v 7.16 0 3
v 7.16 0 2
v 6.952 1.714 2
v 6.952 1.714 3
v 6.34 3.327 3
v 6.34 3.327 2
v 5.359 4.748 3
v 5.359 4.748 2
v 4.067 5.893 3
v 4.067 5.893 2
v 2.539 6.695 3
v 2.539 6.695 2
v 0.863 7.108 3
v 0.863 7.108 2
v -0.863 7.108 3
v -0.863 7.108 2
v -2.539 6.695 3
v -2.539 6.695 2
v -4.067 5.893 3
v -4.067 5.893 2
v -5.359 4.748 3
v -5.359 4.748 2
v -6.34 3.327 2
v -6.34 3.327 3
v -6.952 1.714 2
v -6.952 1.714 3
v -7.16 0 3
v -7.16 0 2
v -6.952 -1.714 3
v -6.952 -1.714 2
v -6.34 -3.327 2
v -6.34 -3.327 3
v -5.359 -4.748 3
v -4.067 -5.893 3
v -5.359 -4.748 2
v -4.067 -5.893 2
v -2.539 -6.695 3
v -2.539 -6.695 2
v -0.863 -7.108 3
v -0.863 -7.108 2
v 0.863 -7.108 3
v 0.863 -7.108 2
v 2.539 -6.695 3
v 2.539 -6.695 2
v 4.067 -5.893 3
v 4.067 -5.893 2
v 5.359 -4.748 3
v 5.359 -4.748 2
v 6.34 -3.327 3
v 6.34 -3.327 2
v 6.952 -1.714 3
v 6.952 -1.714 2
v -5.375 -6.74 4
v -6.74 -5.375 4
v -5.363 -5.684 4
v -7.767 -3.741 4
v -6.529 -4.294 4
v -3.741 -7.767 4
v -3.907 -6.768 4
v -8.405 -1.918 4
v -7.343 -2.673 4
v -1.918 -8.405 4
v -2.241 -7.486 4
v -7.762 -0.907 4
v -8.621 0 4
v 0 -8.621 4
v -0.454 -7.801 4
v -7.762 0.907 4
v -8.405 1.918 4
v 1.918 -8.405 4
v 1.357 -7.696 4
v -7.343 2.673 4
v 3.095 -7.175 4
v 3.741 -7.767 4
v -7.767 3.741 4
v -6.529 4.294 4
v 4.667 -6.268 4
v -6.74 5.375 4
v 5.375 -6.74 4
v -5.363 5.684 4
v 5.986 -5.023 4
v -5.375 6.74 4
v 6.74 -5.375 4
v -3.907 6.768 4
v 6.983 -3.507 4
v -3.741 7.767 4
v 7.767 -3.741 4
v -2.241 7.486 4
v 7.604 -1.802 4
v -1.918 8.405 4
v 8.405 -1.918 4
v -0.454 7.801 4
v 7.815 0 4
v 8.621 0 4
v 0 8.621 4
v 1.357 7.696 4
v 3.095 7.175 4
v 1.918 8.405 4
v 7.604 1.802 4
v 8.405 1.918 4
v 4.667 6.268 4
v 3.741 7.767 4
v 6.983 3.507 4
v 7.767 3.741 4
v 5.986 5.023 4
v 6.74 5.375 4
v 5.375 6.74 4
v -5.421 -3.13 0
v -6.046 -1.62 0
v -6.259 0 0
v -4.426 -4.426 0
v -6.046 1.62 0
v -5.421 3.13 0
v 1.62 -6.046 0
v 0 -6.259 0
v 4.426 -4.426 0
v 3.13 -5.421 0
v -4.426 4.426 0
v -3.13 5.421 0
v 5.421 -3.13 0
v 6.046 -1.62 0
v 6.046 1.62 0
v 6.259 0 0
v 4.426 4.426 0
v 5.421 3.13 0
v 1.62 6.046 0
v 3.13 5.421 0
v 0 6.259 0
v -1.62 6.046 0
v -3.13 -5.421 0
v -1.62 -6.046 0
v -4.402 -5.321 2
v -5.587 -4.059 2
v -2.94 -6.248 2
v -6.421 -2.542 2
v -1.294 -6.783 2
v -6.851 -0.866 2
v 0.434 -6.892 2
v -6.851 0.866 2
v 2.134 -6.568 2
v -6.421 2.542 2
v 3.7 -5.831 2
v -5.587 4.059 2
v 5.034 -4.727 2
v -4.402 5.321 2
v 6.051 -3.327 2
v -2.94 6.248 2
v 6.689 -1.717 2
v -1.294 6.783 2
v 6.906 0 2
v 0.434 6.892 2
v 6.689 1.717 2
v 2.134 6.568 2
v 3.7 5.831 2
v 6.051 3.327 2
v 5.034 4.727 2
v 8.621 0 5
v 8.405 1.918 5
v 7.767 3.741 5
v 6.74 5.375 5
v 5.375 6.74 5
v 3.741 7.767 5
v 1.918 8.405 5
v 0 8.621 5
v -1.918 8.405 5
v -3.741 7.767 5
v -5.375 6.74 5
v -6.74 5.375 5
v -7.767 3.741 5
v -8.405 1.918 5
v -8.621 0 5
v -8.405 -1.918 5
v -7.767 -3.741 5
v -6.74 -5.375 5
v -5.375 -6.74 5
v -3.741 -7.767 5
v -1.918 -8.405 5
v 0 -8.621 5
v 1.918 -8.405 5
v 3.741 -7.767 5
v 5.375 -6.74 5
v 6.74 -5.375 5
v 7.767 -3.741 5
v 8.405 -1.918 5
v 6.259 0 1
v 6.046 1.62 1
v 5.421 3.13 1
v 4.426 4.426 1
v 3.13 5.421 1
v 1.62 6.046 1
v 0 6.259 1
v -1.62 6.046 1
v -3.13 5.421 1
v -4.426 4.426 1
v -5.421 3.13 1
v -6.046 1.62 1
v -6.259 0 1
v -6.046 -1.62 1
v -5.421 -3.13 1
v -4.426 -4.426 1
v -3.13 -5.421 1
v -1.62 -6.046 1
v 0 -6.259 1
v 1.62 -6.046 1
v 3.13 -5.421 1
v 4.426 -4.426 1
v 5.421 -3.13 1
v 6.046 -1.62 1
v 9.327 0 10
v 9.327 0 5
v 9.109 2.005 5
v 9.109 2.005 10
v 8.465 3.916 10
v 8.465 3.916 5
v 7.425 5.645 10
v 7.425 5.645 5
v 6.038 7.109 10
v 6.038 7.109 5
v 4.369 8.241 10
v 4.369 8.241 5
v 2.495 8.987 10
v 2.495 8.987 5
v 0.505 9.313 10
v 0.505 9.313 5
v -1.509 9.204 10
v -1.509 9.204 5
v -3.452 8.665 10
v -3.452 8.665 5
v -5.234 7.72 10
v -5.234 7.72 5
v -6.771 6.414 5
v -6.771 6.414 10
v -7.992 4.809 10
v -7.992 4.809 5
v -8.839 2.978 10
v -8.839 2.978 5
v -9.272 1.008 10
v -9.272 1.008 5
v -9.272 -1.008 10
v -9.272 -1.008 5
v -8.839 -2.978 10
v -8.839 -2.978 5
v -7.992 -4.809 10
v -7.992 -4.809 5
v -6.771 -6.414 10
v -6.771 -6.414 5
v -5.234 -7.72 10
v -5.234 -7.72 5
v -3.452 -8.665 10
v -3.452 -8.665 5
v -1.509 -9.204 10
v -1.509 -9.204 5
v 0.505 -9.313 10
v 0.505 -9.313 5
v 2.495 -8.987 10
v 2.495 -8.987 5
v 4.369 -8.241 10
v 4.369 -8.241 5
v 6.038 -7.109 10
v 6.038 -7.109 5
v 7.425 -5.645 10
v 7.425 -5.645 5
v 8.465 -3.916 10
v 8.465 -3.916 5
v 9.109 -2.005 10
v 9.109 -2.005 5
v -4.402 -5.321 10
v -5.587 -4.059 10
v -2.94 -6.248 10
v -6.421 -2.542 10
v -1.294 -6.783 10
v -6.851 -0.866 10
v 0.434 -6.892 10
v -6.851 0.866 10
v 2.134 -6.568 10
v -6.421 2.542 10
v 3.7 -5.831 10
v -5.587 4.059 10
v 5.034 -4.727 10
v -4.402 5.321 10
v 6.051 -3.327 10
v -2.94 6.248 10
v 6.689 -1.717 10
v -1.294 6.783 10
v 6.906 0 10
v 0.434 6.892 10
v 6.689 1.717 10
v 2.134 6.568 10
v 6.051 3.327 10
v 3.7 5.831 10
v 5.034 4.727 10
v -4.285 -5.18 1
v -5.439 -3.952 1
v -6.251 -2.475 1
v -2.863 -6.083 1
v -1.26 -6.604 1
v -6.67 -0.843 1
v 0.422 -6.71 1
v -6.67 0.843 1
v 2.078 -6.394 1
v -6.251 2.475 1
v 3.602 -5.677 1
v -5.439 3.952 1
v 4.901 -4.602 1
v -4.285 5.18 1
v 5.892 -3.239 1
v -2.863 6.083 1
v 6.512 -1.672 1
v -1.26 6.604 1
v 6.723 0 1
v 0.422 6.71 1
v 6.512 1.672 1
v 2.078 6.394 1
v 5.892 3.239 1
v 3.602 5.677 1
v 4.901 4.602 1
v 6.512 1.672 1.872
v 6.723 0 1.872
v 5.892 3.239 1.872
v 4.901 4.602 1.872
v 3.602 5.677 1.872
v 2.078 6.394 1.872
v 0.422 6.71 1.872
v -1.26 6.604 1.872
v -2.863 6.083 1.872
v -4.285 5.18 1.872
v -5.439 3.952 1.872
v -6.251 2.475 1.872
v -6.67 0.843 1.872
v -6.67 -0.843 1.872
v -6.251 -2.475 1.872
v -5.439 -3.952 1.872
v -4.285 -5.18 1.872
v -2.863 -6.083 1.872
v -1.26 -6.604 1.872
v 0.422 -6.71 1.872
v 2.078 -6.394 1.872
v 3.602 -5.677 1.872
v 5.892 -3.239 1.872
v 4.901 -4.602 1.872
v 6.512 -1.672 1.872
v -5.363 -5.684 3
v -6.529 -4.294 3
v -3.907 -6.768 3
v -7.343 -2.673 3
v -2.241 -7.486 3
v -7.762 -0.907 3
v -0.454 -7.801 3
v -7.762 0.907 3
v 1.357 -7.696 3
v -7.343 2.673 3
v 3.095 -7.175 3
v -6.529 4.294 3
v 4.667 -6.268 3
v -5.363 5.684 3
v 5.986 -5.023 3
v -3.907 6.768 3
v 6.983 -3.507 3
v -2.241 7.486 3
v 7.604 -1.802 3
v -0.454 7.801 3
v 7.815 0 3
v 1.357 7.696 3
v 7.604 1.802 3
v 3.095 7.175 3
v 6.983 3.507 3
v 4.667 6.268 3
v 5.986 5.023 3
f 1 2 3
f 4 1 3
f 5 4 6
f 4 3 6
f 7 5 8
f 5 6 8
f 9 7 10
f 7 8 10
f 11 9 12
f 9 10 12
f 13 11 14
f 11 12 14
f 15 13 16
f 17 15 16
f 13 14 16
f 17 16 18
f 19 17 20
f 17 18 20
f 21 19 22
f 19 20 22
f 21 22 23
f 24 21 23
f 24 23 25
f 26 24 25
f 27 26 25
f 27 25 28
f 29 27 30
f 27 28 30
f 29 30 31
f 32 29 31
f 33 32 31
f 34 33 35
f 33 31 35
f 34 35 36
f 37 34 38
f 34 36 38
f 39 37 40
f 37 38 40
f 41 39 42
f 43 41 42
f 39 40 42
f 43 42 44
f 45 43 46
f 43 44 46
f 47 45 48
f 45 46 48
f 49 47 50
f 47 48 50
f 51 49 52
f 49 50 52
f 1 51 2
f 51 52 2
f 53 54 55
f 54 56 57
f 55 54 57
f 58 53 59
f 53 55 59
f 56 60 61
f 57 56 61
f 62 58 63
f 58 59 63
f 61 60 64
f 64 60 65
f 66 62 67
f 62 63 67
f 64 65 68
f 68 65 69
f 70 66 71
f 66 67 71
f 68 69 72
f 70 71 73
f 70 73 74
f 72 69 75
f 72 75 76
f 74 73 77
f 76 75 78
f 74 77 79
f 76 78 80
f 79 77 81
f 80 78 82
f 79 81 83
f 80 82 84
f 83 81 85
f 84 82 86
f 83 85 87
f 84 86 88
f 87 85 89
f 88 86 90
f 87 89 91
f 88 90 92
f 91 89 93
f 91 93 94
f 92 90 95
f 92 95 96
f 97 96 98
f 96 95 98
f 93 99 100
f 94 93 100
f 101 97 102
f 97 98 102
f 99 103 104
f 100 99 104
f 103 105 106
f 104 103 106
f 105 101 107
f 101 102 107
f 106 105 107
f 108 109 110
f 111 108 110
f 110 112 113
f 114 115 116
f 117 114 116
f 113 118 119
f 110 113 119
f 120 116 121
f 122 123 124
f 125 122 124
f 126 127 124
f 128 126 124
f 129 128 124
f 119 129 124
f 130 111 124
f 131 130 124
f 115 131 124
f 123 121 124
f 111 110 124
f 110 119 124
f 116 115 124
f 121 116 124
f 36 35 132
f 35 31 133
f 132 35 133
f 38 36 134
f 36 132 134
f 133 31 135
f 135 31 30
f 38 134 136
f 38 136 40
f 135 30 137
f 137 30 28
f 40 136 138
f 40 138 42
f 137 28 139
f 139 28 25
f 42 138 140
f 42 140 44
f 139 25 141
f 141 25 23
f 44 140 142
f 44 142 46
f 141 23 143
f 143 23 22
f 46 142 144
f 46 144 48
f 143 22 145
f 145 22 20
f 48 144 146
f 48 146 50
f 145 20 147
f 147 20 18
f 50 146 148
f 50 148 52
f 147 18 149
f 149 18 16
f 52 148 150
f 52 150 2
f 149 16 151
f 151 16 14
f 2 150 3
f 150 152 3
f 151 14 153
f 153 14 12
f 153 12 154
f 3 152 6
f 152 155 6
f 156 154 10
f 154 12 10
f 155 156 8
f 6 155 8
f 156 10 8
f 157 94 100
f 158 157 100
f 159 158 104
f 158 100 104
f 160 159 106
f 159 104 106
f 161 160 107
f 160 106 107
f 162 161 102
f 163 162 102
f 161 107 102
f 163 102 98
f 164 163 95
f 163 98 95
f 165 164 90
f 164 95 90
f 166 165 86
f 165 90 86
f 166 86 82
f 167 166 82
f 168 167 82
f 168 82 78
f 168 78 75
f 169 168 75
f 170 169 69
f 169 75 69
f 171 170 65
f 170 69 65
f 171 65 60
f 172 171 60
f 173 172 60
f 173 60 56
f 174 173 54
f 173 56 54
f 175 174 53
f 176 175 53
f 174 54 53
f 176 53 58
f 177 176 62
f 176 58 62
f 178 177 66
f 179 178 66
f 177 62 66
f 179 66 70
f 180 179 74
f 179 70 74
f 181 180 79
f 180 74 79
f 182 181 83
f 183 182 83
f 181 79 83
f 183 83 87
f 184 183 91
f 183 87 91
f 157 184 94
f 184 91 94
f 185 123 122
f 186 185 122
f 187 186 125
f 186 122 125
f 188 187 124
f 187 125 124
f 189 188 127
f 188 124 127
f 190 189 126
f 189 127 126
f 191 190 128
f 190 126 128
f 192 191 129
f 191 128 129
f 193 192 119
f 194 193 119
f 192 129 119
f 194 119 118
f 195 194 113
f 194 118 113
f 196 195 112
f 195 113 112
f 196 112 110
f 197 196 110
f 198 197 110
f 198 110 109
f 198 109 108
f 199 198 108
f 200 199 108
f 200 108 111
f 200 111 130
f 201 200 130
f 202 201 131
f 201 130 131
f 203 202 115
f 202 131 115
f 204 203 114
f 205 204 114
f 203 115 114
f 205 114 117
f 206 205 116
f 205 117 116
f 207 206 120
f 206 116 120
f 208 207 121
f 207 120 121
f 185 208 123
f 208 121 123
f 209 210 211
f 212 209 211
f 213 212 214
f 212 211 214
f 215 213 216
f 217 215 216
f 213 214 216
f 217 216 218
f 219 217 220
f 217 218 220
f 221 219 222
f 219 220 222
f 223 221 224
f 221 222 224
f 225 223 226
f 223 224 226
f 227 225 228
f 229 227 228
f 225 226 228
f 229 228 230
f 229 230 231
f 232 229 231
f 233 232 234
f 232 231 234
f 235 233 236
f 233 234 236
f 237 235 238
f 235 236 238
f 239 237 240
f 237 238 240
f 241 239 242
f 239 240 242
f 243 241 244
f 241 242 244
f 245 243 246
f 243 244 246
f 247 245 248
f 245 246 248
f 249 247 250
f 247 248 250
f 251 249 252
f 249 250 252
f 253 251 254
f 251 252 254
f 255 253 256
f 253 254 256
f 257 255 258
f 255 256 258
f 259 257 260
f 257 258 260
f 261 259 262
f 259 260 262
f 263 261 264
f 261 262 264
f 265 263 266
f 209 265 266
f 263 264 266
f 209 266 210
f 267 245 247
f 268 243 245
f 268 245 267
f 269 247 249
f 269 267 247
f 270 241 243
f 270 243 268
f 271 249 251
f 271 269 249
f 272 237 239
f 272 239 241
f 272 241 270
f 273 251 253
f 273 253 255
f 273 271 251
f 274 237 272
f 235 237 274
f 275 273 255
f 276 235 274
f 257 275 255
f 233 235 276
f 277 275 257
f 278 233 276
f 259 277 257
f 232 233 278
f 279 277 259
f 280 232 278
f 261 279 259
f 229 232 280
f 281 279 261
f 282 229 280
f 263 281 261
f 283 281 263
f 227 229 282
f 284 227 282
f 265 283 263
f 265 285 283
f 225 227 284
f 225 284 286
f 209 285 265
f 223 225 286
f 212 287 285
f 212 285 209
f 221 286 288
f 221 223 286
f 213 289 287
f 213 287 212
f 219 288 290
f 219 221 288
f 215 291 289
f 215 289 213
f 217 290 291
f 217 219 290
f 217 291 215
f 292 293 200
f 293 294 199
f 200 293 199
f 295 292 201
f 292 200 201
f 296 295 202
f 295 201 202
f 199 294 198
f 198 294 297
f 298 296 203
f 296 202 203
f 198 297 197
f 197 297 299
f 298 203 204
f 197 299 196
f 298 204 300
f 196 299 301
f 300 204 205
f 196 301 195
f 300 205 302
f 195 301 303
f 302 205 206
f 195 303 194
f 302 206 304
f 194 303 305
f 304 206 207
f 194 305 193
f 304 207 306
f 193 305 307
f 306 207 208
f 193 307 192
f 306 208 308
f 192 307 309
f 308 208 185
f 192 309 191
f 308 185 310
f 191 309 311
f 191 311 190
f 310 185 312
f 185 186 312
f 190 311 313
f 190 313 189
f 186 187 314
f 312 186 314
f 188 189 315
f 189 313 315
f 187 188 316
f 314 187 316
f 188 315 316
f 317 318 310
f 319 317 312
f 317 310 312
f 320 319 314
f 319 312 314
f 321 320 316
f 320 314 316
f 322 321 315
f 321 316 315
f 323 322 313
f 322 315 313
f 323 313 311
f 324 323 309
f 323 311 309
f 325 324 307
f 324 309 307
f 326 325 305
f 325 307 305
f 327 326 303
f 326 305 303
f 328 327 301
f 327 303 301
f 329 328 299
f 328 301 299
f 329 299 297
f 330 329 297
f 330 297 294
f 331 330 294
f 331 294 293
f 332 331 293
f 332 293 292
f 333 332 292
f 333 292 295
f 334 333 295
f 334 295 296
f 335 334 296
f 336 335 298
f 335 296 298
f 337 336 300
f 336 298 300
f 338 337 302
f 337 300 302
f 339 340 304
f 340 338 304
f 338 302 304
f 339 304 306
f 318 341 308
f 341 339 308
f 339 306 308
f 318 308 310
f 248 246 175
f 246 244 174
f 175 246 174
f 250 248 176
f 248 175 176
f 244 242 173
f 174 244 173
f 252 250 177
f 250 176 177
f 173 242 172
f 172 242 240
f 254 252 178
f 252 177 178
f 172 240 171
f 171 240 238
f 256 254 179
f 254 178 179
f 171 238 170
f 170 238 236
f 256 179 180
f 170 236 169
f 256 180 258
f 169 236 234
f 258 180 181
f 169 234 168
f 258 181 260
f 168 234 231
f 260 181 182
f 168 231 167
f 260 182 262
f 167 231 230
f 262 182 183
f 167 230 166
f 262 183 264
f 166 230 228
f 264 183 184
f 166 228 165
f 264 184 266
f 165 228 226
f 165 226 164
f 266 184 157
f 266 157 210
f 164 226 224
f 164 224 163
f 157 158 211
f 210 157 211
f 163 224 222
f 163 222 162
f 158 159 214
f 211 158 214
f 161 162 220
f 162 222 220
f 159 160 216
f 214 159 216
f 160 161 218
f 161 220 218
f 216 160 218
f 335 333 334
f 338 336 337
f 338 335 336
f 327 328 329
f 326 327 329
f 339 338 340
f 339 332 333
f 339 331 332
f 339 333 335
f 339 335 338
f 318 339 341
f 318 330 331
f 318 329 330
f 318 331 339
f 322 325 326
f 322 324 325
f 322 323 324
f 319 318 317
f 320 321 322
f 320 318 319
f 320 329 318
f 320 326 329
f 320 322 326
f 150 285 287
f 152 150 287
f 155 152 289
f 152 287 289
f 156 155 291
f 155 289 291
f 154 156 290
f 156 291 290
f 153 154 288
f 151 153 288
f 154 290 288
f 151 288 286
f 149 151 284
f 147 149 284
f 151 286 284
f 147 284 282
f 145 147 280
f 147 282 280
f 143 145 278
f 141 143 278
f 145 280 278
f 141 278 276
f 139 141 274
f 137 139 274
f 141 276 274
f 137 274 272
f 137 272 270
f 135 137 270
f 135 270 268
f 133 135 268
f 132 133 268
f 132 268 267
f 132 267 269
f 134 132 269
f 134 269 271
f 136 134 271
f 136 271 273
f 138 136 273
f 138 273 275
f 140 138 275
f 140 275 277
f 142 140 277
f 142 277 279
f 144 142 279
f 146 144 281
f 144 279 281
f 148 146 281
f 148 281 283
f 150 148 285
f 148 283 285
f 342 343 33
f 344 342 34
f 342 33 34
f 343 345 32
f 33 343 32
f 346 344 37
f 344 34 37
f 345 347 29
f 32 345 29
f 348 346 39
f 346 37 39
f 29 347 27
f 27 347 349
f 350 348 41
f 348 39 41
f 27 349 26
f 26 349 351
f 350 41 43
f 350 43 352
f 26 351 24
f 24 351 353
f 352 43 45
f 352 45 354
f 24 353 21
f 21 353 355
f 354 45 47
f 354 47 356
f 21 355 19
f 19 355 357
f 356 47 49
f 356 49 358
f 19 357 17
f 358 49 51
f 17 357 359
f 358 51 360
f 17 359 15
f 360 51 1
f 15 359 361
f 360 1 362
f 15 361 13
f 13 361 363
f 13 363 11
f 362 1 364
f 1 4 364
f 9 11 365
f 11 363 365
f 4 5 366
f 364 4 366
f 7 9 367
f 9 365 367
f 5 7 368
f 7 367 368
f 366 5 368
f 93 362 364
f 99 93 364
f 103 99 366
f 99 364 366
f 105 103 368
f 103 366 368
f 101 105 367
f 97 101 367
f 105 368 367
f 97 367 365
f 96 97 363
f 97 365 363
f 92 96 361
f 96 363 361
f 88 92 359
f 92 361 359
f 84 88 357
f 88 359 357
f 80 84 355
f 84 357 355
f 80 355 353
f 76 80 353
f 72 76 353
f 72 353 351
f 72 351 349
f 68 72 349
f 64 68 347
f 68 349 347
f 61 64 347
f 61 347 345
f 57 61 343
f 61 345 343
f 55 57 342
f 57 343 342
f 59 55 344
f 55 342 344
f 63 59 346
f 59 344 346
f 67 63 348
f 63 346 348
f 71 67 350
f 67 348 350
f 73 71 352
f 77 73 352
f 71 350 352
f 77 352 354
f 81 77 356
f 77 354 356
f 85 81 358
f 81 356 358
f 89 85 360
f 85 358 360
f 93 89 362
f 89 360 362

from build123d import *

# Parameters (mm, degrees)
F0_R      = 6.259056
F1_DEPTH  = 1
F2_R      = 6.723109
F3_DEPTH  = 1
F4_R      = 7.160143
F5_DEPTH  = 1
F6_R      = 7.814591
F7_DEPTH  = 1
F8_R      = 8.621206
F9_DEPTH  = 1
F10_R     = 9.327107
F11_DEPTH = 5
F12_R     = 6.905639
F13_DEPTH = 8.128


with BuildPart() as f1:
    # F0 (on Top) → F1 (new body)
    with BuildSketch(Plane.XY):
        Circle(F0_R)
    extrude(amount=F1_DEPTH)

    # F2 (on face) → F3 (join)
    with BuildSketch(Plane.XY.offset(1)):
        Circle(F2_R)
    extrude(amount=F3_DEPTH)

    # F4 (on face) → F5 (join)
    with BuildSketch(Plane.XY.offset(2)):
        Circle(F4_R)
    extrude(amount=F5_DEPTH)

    # F6 (on face) → F7 (join)
    with BuildSketch(Plane.XY.offset(3)):
        Circle(F6_R)
    extrude(amount=F7_DEPTH)

    # F8 (on face) → F9 (join)
    with BuildSketch(Plane.XY.offset(4)):
        Circle(F8_R)
    extrude(amount=F9_DEPTH)

    # F10 (on face) → F11 (join)
    with BuildSketch(Plane.XY.offset(5)):
        Circle(F10_R)
    extrude(amount=F11_DEPTH)

    # F12 (on face) → F13 (cut)
    with BuildSketch(Plane.XY.offset(10)):
        Circle(F12_R)
    extrude(amount=-F13_DEPTH, mode=Mode.SUBTRACT)


solid = f1.part
